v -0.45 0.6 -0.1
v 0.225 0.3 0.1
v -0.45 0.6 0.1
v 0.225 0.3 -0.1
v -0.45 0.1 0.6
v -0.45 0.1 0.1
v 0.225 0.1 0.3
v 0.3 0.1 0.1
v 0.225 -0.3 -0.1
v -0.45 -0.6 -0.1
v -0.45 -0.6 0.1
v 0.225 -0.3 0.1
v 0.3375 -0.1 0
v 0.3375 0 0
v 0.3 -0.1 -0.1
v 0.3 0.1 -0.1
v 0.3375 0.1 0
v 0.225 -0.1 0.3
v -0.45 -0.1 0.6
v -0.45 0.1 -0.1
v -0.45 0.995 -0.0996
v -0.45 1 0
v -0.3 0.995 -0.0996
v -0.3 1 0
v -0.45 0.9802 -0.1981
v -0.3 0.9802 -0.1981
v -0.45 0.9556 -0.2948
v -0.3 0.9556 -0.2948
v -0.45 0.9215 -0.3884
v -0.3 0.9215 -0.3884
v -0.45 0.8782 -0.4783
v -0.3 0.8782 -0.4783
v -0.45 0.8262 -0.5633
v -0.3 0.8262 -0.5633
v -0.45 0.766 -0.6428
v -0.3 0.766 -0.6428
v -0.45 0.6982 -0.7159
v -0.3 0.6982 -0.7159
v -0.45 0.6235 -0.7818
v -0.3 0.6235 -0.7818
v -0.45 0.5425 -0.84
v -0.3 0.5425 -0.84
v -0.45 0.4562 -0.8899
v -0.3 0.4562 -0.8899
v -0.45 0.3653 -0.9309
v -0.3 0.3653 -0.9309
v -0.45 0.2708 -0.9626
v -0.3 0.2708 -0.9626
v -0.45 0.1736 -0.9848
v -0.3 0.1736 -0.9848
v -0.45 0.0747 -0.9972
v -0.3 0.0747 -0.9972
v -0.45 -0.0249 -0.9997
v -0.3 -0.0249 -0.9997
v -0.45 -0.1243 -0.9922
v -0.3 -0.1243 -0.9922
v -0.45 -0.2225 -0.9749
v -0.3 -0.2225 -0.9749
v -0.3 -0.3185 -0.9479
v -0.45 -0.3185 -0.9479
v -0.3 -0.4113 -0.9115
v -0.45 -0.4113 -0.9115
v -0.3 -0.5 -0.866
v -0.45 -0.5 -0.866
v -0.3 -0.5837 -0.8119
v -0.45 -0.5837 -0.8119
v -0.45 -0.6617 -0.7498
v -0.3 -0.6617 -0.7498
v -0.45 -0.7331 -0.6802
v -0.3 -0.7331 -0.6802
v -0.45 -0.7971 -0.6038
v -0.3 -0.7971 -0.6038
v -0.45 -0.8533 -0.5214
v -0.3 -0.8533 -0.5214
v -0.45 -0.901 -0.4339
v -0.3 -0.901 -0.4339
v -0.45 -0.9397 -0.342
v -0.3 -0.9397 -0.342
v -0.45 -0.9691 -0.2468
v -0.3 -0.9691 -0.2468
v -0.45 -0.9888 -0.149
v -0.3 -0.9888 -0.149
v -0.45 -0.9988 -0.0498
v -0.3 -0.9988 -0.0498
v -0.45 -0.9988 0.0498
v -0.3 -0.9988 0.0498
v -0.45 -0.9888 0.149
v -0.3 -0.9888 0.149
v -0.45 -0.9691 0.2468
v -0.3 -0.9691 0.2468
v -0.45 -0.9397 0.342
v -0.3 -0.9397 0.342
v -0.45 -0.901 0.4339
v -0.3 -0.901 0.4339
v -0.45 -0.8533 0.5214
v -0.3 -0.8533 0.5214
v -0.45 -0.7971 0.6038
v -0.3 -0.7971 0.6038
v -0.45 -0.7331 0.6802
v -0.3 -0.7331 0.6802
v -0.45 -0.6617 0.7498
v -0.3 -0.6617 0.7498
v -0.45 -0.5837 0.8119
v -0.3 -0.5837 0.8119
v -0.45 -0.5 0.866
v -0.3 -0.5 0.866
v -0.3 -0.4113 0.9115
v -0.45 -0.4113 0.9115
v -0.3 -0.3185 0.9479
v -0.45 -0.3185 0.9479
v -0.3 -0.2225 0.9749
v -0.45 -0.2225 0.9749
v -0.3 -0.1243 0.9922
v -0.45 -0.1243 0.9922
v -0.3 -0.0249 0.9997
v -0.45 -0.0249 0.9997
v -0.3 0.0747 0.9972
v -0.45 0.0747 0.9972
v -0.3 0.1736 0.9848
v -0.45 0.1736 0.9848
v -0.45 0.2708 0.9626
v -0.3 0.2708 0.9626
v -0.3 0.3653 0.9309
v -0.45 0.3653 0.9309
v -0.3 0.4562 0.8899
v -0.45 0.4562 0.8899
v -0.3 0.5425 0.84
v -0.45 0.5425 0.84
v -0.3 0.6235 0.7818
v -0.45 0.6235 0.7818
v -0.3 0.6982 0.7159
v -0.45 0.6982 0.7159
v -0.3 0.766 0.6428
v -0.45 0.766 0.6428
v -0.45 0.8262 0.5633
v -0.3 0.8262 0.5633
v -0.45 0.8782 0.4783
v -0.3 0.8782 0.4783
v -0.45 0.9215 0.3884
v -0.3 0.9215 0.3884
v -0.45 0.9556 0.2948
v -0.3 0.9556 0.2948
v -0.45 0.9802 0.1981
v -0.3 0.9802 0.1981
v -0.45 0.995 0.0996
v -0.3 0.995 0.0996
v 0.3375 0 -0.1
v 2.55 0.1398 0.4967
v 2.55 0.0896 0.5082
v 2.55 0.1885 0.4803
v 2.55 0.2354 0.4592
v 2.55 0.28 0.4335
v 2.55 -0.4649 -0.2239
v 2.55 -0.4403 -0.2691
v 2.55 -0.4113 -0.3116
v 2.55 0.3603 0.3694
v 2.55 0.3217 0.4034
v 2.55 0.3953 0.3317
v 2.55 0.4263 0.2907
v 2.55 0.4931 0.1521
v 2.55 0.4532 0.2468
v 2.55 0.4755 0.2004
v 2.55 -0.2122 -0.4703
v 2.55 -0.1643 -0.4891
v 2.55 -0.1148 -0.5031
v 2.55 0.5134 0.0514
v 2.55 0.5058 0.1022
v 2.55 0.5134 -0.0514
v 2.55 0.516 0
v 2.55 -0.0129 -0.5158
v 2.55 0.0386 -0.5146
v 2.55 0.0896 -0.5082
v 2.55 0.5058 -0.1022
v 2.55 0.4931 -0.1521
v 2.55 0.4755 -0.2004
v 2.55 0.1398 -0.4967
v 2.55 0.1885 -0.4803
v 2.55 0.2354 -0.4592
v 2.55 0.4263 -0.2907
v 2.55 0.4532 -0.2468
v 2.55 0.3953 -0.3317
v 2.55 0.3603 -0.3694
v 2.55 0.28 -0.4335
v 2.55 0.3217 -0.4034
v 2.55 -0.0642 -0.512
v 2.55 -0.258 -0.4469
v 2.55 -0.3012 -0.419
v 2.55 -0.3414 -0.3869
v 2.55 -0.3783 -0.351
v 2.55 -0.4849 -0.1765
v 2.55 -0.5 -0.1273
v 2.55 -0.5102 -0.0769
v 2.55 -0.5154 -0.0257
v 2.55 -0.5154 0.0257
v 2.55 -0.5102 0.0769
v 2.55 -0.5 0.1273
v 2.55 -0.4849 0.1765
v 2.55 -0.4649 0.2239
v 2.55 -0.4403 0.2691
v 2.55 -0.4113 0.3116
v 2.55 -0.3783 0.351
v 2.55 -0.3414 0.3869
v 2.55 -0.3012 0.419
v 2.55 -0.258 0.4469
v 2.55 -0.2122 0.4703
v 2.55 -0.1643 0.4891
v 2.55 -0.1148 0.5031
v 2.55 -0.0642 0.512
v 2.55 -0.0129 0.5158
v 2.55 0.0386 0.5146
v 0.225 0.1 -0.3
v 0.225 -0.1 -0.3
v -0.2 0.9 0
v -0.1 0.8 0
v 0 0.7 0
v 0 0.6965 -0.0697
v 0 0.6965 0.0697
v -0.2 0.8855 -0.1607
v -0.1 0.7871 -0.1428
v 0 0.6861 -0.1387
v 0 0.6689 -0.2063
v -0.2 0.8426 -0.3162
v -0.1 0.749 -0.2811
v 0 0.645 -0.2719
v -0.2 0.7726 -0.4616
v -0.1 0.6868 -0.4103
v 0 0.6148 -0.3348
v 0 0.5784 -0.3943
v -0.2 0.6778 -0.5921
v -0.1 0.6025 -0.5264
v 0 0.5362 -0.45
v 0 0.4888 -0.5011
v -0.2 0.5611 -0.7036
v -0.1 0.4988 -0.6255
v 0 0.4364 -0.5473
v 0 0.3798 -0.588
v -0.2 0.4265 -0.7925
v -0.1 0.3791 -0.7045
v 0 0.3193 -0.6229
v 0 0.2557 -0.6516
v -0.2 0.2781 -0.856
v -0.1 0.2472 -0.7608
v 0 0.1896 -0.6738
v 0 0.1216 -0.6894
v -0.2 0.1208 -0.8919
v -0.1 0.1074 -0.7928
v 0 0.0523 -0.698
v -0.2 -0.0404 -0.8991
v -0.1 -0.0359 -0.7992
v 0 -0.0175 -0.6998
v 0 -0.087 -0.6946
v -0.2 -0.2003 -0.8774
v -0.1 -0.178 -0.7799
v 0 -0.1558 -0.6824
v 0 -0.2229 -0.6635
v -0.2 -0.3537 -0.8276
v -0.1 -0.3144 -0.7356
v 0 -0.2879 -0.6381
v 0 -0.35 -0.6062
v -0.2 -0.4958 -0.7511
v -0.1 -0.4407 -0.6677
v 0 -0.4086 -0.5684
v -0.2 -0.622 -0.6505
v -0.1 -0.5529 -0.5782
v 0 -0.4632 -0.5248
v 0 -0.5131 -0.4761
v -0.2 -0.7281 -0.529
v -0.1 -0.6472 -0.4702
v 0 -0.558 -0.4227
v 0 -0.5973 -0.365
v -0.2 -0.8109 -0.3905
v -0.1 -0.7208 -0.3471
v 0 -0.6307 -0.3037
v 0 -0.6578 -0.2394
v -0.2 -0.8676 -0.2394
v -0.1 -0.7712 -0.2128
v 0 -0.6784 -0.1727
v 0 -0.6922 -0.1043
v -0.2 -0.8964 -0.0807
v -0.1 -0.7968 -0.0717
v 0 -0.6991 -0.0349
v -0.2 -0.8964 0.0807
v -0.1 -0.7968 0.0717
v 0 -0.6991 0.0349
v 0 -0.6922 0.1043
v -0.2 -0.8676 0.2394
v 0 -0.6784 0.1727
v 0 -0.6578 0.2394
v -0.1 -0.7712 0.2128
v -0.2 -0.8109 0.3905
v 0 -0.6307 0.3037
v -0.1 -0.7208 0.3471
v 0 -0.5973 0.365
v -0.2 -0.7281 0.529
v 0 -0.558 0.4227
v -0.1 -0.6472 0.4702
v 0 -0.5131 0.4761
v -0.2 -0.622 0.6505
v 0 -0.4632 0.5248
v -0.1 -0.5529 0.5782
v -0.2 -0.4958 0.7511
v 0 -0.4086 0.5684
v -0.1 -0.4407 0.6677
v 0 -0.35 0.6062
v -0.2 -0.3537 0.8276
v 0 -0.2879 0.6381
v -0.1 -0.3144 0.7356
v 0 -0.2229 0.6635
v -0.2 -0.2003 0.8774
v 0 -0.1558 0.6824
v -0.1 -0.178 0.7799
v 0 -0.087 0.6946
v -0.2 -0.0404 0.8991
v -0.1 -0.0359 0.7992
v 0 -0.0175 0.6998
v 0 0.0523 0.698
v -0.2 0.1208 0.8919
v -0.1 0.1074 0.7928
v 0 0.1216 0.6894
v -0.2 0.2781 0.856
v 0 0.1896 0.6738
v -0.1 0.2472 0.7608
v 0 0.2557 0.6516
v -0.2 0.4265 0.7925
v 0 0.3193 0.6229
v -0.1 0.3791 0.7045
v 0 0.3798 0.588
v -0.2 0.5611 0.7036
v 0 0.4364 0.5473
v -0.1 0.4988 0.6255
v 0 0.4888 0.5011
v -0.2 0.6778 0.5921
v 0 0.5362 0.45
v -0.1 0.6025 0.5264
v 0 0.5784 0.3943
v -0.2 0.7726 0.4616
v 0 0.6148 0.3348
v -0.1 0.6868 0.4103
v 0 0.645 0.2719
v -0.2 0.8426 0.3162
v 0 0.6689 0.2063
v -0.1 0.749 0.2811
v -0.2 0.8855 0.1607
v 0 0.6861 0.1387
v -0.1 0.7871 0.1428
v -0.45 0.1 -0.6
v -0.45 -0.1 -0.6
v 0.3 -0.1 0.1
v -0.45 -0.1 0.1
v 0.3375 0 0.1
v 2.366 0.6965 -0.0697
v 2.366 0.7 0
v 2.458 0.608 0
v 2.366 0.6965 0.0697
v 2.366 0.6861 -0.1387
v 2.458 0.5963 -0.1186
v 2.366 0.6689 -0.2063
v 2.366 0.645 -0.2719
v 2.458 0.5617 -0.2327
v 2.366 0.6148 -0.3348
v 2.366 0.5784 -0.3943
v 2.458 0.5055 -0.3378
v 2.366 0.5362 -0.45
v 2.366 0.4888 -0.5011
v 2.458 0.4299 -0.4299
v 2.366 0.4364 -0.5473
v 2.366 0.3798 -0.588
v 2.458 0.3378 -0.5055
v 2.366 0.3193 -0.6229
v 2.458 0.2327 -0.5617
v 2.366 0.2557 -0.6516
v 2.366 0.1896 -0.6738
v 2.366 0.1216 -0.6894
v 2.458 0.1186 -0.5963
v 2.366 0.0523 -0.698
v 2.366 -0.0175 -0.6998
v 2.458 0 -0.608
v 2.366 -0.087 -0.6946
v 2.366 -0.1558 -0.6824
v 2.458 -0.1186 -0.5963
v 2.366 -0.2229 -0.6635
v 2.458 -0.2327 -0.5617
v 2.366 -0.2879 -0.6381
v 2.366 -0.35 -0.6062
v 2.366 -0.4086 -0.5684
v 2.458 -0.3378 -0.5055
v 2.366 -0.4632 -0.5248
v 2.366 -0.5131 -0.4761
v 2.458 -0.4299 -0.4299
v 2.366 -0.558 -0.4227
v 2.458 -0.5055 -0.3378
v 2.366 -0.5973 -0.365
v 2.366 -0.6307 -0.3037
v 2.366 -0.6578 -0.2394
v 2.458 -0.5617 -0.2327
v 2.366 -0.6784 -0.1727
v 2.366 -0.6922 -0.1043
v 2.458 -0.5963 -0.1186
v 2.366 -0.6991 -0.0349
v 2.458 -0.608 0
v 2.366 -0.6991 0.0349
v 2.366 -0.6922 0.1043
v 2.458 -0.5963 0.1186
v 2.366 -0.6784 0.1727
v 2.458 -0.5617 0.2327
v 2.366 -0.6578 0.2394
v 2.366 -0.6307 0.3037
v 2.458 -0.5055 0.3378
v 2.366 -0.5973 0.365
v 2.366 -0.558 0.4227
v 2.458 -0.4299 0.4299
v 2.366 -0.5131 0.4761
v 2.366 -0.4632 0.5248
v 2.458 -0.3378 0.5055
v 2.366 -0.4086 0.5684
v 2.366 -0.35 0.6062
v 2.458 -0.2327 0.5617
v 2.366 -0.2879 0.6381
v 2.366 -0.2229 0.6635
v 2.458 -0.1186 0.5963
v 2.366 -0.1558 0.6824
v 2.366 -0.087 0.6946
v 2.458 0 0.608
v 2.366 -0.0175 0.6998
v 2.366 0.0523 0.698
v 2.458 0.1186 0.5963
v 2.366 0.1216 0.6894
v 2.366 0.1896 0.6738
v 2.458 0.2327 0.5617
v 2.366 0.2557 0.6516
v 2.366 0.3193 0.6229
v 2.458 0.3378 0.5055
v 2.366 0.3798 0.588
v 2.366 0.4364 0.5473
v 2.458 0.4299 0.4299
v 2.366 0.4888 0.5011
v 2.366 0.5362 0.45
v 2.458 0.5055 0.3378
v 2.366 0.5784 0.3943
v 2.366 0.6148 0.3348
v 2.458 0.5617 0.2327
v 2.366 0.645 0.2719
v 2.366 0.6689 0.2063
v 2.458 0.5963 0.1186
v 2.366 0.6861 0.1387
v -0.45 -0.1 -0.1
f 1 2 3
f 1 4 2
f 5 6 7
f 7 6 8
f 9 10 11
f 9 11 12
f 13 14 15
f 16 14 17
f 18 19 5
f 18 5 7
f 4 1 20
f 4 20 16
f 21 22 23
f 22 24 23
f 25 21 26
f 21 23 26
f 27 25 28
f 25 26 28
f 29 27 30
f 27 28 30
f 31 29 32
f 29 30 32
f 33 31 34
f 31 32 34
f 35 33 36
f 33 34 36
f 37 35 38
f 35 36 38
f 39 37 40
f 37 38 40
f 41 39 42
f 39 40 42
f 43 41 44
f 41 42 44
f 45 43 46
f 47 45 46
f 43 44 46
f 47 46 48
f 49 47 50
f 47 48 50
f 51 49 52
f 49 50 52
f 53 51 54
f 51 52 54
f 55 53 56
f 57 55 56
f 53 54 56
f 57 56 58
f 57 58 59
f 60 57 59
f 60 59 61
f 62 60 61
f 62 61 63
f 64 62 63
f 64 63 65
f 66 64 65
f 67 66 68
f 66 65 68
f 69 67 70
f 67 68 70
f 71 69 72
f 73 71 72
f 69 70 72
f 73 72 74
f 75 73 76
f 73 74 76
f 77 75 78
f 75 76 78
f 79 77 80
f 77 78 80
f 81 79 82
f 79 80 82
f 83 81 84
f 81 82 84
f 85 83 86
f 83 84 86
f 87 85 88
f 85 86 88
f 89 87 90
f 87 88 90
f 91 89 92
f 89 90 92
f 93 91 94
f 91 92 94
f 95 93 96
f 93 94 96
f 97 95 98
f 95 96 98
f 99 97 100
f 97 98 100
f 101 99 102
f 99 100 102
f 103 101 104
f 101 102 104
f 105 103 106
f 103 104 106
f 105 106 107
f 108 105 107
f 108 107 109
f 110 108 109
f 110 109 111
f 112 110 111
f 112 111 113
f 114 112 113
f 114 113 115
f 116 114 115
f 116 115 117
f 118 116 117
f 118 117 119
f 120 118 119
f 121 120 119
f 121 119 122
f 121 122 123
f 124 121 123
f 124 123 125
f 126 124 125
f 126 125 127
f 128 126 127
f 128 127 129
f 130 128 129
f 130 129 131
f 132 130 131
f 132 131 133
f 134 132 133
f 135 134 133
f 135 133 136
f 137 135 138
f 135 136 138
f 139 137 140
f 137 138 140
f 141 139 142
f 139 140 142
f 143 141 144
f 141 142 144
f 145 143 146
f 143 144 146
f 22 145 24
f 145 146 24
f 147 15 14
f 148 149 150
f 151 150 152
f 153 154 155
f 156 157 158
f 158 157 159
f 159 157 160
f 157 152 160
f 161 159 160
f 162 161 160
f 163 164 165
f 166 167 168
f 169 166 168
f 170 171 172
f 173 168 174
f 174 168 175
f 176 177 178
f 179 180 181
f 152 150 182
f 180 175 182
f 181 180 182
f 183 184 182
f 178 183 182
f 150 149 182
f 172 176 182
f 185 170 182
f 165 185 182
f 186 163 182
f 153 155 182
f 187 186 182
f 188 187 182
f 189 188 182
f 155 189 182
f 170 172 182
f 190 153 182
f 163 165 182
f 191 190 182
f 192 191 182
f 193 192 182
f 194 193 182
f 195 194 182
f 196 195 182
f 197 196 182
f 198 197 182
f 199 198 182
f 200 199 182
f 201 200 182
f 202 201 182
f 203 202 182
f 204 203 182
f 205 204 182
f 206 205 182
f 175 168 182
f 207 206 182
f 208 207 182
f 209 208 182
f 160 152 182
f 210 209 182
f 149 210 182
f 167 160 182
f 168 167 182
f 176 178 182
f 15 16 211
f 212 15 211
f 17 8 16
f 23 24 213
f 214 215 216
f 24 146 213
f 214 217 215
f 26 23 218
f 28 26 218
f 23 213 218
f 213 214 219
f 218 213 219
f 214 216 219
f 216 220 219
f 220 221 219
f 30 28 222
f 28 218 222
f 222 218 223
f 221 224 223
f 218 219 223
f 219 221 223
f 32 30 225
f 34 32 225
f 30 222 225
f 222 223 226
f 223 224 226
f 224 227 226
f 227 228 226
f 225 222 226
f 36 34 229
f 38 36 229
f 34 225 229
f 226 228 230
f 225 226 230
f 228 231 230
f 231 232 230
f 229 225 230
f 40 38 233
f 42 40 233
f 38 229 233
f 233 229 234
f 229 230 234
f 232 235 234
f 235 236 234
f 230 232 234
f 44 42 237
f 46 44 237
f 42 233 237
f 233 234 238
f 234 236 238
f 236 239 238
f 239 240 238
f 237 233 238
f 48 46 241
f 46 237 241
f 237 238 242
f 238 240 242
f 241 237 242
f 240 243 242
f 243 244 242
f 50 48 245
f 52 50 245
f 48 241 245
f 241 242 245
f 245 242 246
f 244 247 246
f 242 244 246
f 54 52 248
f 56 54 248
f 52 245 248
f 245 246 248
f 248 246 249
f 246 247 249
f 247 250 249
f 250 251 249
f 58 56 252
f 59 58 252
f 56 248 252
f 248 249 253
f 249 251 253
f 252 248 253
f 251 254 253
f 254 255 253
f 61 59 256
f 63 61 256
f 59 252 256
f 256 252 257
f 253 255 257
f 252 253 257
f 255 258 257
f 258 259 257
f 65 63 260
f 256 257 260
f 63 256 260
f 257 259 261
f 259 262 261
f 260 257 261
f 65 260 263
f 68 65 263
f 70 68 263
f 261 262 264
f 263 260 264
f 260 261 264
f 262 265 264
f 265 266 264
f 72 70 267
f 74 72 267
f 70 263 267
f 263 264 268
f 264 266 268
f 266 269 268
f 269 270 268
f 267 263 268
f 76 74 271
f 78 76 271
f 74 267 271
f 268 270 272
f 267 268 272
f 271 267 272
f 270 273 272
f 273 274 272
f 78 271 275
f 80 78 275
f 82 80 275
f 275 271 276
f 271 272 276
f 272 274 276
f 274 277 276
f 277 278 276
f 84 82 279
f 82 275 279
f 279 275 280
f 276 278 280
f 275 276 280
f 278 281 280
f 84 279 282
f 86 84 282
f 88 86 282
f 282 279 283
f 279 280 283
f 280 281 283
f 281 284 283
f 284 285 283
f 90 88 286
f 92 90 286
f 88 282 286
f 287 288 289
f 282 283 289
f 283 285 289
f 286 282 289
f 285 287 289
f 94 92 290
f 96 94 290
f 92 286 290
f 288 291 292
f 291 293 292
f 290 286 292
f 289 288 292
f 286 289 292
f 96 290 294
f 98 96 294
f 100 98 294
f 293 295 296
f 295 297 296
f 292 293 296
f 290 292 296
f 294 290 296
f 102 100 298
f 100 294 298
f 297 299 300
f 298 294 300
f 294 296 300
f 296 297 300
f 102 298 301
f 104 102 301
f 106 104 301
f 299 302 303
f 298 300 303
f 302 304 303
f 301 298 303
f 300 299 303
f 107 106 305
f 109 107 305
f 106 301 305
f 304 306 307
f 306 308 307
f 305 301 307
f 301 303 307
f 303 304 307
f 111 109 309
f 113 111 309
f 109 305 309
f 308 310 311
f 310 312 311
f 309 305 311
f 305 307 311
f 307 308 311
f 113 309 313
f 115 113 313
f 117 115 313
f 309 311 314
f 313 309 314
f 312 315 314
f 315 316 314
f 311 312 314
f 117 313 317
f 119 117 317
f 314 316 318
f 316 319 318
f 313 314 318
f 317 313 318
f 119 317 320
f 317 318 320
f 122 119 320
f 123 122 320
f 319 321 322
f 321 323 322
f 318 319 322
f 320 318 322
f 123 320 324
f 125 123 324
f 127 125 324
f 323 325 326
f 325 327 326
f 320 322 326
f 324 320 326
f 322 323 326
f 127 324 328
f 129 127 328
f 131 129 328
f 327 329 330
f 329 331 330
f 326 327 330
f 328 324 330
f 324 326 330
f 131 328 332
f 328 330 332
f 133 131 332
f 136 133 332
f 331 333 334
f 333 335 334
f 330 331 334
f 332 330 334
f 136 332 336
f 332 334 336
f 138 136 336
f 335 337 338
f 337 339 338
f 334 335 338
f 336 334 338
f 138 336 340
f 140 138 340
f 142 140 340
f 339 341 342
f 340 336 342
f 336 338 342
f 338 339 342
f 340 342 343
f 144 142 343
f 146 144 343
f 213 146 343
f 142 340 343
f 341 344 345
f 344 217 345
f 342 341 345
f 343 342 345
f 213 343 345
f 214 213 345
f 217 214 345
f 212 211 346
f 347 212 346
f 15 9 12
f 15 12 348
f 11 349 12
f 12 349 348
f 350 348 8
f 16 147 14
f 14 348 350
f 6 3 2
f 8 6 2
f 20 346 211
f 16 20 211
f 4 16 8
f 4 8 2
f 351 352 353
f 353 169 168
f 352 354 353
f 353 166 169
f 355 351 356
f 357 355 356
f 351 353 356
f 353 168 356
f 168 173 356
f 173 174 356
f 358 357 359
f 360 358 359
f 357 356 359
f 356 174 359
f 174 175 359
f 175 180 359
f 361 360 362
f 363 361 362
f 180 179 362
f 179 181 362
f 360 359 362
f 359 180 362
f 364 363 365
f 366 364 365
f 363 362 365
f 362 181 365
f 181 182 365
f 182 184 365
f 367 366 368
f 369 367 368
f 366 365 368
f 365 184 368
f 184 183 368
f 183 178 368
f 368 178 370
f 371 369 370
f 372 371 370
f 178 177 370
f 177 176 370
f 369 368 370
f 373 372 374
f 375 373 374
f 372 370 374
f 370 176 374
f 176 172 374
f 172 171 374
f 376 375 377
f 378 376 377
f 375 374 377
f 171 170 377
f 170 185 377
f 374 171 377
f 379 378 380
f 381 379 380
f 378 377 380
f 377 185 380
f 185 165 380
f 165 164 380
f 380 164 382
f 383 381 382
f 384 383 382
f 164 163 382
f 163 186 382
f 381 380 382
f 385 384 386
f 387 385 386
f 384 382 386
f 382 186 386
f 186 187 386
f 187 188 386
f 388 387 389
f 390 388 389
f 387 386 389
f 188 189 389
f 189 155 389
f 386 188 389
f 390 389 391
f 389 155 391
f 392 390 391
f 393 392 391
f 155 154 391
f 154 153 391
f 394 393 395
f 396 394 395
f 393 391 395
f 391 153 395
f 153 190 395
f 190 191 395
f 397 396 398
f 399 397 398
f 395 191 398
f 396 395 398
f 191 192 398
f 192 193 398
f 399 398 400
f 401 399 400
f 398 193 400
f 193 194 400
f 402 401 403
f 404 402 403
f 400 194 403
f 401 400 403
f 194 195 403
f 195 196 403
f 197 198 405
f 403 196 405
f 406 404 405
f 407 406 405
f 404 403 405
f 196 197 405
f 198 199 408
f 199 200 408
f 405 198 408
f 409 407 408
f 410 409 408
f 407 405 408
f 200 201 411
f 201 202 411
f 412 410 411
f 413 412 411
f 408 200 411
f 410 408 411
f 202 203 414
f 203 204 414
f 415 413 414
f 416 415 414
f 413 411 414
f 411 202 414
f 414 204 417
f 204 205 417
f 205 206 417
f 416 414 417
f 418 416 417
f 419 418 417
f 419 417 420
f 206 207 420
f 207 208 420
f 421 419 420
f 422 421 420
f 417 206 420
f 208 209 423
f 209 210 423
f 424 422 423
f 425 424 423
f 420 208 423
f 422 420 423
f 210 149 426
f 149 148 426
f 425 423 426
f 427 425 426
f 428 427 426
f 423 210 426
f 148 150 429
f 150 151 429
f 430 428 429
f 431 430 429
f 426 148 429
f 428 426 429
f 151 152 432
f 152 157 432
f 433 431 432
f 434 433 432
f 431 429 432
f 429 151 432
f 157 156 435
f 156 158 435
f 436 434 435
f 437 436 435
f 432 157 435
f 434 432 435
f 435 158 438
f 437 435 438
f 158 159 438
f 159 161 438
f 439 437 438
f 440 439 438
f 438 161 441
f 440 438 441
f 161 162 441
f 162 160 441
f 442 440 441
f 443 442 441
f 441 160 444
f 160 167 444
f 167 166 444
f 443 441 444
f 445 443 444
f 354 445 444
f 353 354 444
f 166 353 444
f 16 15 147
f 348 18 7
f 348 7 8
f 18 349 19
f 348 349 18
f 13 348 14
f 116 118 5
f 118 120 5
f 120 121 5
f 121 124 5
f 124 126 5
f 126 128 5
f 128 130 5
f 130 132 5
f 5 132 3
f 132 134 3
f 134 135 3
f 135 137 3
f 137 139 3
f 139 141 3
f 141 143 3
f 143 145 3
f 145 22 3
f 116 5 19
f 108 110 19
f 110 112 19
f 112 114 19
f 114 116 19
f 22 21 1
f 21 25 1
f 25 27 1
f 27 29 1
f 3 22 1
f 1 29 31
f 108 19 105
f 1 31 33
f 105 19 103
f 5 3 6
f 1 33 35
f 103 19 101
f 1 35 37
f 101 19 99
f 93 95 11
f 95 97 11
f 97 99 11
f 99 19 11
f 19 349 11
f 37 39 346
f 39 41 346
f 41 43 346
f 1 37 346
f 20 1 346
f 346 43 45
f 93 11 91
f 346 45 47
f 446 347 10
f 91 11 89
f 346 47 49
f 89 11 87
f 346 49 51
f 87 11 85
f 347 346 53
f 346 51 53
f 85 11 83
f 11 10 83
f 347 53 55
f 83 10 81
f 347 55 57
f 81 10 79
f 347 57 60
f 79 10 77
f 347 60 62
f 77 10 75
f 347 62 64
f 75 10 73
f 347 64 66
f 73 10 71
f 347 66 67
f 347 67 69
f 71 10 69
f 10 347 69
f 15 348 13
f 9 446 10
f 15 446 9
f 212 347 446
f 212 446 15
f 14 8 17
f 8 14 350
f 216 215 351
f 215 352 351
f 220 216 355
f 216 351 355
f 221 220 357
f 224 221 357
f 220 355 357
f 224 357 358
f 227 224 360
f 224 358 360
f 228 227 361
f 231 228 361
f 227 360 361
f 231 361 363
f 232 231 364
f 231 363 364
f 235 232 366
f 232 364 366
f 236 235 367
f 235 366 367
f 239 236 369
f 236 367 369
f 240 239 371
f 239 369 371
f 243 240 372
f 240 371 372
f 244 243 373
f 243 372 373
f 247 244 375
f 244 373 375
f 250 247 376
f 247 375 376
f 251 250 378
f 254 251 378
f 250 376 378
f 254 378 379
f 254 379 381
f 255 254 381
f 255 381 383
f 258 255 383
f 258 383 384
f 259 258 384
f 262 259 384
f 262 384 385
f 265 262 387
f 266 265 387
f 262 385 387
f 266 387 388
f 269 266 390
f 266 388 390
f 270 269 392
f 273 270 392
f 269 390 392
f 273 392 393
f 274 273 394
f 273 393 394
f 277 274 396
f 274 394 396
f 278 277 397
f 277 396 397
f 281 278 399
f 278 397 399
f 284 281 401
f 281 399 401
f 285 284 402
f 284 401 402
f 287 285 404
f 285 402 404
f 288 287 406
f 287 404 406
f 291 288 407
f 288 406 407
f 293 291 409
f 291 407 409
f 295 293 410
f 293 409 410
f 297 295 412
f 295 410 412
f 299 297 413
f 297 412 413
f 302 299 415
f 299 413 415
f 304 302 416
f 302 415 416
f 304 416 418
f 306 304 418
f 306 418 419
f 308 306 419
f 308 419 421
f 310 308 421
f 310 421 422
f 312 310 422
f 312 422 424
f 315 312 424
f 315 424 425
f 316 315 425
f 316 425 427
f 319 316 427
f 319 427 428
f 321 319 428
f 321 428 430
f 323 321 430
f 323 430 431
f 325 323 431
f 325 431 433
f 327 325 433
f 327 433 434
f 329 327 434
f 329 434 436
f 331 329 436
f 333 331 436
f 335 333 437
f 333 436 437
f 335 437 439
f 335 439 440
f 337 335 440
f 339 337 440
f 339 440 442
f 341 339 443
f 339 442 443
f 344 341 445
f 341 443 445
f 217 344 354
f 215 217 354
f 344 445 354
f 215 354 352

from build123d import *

# Parameters (mm, degrees)
CUT_EXTRUDE1_DEPTH      = 0.1
CUT_EXTRUDE1_DEPTH_BACK = 0.1
CUT_EXTRUDE2_DEPTH      = 0.1
CUT_EXTRUDE2_DEPTH_BACK = 0.1


with BuildPart() as part:
    # Sketch1 → Revolve1 (revolve)
    with BuildSketch(Plane.XY):
        Polygon((-0.45, 0), (-0.45, 1), (-0.3, 1), (0, 0.7), (2.366, 0.7), (2.55, 0.516), (2.55, 0), align=None)
    revolve(axis=Axis((2.55, 0, 0), (-1, 0, 0)))

    # Sketch2 → Cut-Extrude1 (cut, two sides: drawn at the far end of the back side and taken through both)
    with BuildSketch(Plane.XY.offset(-CUT_EXTRUDE1_DEPTH_BACK)):
        Polygon((-0.45, -0.6), (0.225, -0.3), (0.3375, 0), (0.225, 0.3), (-0.45, 0.6), align=None)
    extrude(amount=CUT_EXTRUDE1_DEPTH + CUT_EXTRUDE1_DEPTH_BACK, mode=Mode.SUBTRACT)

    # Sketch3 → Cut-Extrude2 (cut, two sides: drawn at the far end of the back side and taken through both)
    with BuildSketch(Plane(origin=(0, 0, 0), x_dir=(1, 0, 0), z_dir=(0, 1, 0)).offset(-CUT_EXTRUDE2_DEPTH_BACK)):
        Polygon((-0.45, -0.6), (0.225, -0.3), (0.3375, 0), (0.225, 0.3), (-0.45, 0.6), align=None)
    extrude(amount=CUT_EXTRUDE2_DEPTH + CUT_EXTRUDE2_DEPTH_BACK, mode=Mode.SUBTRACT)


solid = part.part
